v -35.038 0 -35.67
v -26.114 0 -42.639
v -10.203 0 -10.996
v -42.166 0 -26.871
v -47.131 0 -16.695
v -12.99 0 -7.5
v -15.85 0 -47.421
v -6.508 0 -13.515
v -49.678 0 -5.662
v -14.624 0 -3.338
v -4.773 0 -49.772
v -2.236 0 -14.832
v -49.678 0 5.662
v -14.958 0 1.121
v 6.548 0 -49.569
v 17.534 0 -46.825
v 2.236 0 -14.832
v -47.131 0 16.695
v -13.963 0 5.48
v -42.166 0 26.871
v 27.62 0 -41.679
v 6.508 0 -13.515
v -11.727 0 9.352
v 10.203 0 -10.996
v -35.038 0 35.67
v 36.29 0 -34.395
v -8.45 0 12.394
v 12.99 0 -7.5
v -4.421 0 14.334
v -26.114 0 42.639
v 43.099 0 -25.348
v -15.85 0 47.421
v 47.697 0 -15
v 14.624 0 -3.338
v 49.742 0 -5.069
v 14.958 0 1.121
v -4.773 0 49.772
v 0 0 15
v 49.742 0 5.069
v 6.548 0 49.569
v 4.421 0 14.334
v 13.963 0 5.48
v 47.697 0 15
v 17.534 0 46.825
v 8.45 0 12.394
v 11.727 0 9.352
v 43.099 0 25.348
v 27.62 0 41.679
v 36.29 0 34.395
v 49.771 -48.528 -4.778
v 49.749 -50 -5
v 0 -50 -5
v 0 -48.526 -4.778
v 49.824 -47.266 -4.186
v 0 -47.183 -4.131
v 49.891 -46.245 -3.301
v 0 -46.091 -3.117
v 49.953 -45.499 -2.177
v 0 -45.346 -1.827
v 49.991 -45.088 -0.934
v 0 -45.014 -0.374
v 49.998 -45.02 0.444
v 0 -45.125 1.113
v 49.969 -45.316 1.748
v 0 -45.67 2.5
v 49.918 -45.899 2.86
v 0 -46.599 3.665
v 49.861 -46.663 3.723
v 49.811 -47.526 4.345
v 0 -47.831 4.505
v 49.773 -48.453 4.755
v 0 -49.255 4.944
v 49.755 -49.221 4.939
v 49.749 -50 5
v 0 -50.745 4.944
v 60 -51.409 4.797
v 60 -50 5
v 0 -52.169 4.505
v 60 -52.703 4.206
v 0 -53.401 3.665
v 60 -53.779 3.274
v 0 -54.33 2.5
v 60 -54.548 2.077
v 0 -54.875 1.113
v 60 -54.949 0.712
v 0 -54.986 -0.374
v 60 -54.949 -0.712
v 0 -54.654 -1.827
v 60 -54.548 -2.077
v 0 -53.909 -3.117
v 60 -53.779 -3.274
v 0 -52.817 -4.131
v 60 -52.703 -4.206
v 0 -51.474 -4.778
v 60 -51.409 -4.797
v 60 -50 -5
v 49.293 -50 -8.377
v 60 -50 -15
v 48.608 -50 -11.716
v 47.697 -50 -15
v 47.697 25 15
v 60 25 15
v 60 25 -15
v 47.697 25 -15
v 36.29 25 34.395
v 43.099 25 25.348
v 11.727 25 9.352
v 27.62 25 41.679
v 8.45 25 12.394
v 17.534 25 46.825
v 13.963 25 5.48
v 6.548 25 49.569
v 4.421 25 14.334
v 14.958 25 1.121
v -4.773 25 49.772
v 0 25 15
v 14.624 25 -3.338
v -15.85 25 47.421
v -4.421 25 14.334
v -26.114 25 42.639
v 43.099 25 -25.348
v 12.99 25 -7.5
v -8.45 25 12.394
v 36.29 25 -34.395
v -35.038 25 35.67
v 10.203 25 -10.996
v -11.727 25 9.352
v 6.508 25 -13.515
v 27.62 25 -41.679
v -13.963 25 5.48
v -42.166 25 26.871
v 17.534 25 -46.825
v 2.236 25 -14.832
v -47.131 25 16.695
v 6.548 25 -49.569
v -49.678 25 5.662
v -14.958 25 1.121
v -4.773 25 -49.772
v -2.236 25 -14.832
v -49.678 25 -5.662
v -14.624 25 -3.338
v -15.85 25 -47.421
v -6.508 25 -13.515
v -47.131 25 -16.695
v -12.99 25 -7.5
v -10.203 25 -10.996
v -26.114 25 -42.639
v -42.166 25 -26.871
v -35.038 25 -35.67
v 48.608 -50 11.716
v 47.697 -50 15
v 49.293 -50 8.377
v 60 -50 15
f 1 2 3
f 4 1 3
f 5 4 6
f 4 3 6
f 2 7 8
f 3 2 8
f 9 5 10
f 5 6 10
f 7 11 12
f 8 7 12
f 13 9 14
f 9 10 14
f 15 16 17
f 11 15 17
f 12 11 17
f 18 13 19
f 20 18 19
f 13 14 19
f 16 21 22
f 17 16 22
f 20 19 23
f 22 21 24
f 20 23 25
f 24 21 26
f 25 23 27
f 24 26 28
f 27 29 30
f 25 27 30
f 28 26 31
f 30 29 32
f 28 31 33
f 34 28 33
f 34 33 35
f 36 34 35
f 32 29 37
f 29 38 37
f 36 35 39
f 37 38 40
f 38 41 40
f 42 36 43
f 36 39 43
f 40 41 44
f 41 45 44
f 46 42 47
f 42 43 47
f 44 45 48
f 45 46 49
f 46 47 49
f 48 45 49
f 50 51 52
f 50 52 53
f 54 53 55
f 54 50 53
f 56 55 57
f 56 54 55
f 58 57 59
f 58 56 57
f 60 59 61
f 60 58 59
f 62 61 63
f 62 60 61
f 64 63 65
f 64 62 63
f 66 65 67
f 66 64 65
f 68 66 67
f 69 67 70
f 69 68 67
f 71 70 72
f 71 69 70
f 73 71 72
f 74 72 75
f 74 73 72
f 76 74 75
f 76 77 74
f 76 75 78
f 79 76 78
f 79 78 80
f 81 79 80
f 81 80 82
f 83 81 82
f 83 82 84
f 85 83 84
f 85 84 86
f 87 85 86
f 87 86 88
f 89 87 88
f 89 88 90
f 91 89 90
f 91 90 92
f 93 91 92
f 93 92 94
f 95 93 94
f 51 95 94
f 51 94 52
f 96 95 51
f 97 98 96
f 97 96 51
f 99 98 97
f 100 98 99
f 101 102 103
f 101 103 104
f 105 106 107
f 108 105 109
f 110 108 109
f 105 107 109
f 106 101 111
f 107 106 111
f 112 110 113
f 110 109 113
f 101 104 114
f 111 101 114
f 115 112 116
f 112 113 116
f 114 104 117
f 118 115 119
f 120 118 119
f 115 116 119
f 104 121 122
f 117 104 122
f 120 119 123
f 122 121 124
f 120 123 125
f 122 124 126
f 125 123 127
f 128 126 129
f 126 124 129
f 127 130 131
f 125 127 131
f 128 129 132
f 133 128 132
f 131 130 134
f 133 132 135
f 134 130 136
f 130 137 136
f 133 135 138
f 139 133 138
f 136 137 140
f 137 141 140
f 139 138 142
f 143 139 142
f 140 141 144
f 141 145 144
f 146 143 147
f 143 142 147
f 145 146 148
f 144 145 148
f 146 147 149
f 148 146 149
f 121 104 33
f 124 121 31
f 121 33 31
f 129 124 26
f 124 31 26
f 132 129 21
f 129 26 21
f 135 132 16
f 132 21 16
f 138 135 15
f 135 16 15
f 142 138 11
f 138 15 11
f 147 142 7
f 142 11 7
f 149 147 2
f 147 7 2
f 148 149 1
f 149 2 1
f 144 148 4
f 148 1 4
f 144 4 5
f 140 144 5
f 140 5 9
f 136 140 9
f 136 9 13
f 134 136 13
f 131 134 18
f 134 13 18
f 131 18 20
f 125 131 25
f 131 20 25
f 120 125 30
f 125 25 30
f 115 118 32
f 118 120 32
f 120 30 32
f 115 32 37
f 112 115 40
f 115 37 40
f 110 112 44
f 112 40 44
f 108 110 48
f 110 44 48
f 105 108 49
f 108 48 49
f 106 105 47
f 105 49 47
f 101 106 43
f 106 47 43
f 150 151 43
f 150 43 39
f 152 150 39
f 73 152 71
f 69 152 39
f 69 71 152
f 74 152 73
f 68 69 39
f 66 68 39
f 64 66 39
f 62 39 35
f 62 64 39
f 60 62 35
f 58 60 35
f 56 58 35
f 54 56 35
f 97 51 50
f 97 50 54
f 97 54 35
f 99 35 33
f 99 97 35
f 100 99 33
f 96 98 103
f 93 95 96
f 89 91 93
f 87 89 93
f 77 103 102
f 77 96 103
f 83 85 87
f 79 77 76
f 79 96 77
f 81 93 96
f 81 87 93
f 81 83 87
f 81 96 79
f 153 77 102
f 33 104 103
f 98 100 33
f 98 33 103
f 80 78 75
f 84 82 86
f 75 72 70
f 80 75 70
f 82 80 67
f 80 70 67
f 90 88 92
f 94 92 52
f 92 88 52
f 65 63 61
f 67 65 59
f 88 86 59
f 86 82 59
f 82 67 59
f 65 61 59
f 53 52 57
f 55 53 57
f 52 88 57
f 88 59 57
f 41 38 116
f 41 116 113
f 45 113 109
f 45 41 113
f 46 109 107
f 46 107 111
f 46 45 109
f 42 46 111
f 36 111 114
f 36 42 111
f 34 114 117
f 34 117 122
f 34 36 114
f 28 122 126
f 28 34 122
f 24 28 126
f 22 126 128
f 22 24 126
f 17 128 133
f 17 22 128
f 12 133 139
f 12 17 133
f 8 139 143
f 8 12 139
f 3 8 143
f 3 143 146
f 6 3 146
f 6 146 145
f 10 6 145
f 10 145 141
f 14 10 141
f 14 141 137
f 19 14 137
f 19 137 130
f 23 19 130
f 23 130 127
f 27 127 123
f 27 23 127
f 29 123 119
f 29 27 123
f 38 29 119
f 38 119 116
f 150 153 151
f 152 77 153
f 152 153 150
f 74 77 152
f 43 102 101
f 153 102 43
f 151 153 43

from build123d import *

# Parameters (mm, degrees)
SKETCH2_R           = 50
SKETCH2_R_2         = 15
BOSS_EXTRUDE1_DEPTH = 25
BOSS_EXTRUDE2_START = -75
BOSS_EXTRUDE2_DEPTH = 75
SKETCH4_R           = 5
BOSS_EXTRUDE3_DEPTH = 60


with BuildPart() as part:
    # Sketch2 → Boss-Extrude1 (new body)
    with BuildSketch(Plane(origin=(0, 0, 0), x_dir=(1, 0, 0), z_dir=(0, 1, 0))):
        with Locations(Location((0, 0, 0), (0, 0, 270))):
            Circle(SKETCH2_R)
        with Locations(Location((0, 0, 0), (0, 0, 270))):
            Circle(SKETCH2_R_2, mode=Mode.SUBTRACT)
    extrude(amount=BOSS_EXTRUDE1_DEPTH)

    # Sketch3 → Boss-Extrude2 (add)
    with BuildSketch(Plane(origin=(0, 25, 0), x_dir=(1, 0, 0), z_dir=(0, 1, 0)).offset(BOSS_EXTRUDE2_START)):
        with BuildLine():
            Line((47.696960071, 15), (60, 15))
            Line((60, 15), (60, -15))
            Line((60, -15), (47.696960071, -15))
            ThreePointArc((47.696960071, -15), (50, 0), (47.696960071, 15))
        make_face()
    extrude(amount=BOSS_EXTRUDE2_DEPTH)

    # Sketch4 → Boss-Extrude3 (add)
    with BuildSketch(Plane(origin=(60, 0, 0), x_dir=(0, 0, -1), z_dir=(1, 0, 0))):
        with Locations((0, -50)):
            Circle(SKETCH4_R)
    extrude(amount=-BOSS_EXTRUDE3_DEPTH)


solid = part.part
